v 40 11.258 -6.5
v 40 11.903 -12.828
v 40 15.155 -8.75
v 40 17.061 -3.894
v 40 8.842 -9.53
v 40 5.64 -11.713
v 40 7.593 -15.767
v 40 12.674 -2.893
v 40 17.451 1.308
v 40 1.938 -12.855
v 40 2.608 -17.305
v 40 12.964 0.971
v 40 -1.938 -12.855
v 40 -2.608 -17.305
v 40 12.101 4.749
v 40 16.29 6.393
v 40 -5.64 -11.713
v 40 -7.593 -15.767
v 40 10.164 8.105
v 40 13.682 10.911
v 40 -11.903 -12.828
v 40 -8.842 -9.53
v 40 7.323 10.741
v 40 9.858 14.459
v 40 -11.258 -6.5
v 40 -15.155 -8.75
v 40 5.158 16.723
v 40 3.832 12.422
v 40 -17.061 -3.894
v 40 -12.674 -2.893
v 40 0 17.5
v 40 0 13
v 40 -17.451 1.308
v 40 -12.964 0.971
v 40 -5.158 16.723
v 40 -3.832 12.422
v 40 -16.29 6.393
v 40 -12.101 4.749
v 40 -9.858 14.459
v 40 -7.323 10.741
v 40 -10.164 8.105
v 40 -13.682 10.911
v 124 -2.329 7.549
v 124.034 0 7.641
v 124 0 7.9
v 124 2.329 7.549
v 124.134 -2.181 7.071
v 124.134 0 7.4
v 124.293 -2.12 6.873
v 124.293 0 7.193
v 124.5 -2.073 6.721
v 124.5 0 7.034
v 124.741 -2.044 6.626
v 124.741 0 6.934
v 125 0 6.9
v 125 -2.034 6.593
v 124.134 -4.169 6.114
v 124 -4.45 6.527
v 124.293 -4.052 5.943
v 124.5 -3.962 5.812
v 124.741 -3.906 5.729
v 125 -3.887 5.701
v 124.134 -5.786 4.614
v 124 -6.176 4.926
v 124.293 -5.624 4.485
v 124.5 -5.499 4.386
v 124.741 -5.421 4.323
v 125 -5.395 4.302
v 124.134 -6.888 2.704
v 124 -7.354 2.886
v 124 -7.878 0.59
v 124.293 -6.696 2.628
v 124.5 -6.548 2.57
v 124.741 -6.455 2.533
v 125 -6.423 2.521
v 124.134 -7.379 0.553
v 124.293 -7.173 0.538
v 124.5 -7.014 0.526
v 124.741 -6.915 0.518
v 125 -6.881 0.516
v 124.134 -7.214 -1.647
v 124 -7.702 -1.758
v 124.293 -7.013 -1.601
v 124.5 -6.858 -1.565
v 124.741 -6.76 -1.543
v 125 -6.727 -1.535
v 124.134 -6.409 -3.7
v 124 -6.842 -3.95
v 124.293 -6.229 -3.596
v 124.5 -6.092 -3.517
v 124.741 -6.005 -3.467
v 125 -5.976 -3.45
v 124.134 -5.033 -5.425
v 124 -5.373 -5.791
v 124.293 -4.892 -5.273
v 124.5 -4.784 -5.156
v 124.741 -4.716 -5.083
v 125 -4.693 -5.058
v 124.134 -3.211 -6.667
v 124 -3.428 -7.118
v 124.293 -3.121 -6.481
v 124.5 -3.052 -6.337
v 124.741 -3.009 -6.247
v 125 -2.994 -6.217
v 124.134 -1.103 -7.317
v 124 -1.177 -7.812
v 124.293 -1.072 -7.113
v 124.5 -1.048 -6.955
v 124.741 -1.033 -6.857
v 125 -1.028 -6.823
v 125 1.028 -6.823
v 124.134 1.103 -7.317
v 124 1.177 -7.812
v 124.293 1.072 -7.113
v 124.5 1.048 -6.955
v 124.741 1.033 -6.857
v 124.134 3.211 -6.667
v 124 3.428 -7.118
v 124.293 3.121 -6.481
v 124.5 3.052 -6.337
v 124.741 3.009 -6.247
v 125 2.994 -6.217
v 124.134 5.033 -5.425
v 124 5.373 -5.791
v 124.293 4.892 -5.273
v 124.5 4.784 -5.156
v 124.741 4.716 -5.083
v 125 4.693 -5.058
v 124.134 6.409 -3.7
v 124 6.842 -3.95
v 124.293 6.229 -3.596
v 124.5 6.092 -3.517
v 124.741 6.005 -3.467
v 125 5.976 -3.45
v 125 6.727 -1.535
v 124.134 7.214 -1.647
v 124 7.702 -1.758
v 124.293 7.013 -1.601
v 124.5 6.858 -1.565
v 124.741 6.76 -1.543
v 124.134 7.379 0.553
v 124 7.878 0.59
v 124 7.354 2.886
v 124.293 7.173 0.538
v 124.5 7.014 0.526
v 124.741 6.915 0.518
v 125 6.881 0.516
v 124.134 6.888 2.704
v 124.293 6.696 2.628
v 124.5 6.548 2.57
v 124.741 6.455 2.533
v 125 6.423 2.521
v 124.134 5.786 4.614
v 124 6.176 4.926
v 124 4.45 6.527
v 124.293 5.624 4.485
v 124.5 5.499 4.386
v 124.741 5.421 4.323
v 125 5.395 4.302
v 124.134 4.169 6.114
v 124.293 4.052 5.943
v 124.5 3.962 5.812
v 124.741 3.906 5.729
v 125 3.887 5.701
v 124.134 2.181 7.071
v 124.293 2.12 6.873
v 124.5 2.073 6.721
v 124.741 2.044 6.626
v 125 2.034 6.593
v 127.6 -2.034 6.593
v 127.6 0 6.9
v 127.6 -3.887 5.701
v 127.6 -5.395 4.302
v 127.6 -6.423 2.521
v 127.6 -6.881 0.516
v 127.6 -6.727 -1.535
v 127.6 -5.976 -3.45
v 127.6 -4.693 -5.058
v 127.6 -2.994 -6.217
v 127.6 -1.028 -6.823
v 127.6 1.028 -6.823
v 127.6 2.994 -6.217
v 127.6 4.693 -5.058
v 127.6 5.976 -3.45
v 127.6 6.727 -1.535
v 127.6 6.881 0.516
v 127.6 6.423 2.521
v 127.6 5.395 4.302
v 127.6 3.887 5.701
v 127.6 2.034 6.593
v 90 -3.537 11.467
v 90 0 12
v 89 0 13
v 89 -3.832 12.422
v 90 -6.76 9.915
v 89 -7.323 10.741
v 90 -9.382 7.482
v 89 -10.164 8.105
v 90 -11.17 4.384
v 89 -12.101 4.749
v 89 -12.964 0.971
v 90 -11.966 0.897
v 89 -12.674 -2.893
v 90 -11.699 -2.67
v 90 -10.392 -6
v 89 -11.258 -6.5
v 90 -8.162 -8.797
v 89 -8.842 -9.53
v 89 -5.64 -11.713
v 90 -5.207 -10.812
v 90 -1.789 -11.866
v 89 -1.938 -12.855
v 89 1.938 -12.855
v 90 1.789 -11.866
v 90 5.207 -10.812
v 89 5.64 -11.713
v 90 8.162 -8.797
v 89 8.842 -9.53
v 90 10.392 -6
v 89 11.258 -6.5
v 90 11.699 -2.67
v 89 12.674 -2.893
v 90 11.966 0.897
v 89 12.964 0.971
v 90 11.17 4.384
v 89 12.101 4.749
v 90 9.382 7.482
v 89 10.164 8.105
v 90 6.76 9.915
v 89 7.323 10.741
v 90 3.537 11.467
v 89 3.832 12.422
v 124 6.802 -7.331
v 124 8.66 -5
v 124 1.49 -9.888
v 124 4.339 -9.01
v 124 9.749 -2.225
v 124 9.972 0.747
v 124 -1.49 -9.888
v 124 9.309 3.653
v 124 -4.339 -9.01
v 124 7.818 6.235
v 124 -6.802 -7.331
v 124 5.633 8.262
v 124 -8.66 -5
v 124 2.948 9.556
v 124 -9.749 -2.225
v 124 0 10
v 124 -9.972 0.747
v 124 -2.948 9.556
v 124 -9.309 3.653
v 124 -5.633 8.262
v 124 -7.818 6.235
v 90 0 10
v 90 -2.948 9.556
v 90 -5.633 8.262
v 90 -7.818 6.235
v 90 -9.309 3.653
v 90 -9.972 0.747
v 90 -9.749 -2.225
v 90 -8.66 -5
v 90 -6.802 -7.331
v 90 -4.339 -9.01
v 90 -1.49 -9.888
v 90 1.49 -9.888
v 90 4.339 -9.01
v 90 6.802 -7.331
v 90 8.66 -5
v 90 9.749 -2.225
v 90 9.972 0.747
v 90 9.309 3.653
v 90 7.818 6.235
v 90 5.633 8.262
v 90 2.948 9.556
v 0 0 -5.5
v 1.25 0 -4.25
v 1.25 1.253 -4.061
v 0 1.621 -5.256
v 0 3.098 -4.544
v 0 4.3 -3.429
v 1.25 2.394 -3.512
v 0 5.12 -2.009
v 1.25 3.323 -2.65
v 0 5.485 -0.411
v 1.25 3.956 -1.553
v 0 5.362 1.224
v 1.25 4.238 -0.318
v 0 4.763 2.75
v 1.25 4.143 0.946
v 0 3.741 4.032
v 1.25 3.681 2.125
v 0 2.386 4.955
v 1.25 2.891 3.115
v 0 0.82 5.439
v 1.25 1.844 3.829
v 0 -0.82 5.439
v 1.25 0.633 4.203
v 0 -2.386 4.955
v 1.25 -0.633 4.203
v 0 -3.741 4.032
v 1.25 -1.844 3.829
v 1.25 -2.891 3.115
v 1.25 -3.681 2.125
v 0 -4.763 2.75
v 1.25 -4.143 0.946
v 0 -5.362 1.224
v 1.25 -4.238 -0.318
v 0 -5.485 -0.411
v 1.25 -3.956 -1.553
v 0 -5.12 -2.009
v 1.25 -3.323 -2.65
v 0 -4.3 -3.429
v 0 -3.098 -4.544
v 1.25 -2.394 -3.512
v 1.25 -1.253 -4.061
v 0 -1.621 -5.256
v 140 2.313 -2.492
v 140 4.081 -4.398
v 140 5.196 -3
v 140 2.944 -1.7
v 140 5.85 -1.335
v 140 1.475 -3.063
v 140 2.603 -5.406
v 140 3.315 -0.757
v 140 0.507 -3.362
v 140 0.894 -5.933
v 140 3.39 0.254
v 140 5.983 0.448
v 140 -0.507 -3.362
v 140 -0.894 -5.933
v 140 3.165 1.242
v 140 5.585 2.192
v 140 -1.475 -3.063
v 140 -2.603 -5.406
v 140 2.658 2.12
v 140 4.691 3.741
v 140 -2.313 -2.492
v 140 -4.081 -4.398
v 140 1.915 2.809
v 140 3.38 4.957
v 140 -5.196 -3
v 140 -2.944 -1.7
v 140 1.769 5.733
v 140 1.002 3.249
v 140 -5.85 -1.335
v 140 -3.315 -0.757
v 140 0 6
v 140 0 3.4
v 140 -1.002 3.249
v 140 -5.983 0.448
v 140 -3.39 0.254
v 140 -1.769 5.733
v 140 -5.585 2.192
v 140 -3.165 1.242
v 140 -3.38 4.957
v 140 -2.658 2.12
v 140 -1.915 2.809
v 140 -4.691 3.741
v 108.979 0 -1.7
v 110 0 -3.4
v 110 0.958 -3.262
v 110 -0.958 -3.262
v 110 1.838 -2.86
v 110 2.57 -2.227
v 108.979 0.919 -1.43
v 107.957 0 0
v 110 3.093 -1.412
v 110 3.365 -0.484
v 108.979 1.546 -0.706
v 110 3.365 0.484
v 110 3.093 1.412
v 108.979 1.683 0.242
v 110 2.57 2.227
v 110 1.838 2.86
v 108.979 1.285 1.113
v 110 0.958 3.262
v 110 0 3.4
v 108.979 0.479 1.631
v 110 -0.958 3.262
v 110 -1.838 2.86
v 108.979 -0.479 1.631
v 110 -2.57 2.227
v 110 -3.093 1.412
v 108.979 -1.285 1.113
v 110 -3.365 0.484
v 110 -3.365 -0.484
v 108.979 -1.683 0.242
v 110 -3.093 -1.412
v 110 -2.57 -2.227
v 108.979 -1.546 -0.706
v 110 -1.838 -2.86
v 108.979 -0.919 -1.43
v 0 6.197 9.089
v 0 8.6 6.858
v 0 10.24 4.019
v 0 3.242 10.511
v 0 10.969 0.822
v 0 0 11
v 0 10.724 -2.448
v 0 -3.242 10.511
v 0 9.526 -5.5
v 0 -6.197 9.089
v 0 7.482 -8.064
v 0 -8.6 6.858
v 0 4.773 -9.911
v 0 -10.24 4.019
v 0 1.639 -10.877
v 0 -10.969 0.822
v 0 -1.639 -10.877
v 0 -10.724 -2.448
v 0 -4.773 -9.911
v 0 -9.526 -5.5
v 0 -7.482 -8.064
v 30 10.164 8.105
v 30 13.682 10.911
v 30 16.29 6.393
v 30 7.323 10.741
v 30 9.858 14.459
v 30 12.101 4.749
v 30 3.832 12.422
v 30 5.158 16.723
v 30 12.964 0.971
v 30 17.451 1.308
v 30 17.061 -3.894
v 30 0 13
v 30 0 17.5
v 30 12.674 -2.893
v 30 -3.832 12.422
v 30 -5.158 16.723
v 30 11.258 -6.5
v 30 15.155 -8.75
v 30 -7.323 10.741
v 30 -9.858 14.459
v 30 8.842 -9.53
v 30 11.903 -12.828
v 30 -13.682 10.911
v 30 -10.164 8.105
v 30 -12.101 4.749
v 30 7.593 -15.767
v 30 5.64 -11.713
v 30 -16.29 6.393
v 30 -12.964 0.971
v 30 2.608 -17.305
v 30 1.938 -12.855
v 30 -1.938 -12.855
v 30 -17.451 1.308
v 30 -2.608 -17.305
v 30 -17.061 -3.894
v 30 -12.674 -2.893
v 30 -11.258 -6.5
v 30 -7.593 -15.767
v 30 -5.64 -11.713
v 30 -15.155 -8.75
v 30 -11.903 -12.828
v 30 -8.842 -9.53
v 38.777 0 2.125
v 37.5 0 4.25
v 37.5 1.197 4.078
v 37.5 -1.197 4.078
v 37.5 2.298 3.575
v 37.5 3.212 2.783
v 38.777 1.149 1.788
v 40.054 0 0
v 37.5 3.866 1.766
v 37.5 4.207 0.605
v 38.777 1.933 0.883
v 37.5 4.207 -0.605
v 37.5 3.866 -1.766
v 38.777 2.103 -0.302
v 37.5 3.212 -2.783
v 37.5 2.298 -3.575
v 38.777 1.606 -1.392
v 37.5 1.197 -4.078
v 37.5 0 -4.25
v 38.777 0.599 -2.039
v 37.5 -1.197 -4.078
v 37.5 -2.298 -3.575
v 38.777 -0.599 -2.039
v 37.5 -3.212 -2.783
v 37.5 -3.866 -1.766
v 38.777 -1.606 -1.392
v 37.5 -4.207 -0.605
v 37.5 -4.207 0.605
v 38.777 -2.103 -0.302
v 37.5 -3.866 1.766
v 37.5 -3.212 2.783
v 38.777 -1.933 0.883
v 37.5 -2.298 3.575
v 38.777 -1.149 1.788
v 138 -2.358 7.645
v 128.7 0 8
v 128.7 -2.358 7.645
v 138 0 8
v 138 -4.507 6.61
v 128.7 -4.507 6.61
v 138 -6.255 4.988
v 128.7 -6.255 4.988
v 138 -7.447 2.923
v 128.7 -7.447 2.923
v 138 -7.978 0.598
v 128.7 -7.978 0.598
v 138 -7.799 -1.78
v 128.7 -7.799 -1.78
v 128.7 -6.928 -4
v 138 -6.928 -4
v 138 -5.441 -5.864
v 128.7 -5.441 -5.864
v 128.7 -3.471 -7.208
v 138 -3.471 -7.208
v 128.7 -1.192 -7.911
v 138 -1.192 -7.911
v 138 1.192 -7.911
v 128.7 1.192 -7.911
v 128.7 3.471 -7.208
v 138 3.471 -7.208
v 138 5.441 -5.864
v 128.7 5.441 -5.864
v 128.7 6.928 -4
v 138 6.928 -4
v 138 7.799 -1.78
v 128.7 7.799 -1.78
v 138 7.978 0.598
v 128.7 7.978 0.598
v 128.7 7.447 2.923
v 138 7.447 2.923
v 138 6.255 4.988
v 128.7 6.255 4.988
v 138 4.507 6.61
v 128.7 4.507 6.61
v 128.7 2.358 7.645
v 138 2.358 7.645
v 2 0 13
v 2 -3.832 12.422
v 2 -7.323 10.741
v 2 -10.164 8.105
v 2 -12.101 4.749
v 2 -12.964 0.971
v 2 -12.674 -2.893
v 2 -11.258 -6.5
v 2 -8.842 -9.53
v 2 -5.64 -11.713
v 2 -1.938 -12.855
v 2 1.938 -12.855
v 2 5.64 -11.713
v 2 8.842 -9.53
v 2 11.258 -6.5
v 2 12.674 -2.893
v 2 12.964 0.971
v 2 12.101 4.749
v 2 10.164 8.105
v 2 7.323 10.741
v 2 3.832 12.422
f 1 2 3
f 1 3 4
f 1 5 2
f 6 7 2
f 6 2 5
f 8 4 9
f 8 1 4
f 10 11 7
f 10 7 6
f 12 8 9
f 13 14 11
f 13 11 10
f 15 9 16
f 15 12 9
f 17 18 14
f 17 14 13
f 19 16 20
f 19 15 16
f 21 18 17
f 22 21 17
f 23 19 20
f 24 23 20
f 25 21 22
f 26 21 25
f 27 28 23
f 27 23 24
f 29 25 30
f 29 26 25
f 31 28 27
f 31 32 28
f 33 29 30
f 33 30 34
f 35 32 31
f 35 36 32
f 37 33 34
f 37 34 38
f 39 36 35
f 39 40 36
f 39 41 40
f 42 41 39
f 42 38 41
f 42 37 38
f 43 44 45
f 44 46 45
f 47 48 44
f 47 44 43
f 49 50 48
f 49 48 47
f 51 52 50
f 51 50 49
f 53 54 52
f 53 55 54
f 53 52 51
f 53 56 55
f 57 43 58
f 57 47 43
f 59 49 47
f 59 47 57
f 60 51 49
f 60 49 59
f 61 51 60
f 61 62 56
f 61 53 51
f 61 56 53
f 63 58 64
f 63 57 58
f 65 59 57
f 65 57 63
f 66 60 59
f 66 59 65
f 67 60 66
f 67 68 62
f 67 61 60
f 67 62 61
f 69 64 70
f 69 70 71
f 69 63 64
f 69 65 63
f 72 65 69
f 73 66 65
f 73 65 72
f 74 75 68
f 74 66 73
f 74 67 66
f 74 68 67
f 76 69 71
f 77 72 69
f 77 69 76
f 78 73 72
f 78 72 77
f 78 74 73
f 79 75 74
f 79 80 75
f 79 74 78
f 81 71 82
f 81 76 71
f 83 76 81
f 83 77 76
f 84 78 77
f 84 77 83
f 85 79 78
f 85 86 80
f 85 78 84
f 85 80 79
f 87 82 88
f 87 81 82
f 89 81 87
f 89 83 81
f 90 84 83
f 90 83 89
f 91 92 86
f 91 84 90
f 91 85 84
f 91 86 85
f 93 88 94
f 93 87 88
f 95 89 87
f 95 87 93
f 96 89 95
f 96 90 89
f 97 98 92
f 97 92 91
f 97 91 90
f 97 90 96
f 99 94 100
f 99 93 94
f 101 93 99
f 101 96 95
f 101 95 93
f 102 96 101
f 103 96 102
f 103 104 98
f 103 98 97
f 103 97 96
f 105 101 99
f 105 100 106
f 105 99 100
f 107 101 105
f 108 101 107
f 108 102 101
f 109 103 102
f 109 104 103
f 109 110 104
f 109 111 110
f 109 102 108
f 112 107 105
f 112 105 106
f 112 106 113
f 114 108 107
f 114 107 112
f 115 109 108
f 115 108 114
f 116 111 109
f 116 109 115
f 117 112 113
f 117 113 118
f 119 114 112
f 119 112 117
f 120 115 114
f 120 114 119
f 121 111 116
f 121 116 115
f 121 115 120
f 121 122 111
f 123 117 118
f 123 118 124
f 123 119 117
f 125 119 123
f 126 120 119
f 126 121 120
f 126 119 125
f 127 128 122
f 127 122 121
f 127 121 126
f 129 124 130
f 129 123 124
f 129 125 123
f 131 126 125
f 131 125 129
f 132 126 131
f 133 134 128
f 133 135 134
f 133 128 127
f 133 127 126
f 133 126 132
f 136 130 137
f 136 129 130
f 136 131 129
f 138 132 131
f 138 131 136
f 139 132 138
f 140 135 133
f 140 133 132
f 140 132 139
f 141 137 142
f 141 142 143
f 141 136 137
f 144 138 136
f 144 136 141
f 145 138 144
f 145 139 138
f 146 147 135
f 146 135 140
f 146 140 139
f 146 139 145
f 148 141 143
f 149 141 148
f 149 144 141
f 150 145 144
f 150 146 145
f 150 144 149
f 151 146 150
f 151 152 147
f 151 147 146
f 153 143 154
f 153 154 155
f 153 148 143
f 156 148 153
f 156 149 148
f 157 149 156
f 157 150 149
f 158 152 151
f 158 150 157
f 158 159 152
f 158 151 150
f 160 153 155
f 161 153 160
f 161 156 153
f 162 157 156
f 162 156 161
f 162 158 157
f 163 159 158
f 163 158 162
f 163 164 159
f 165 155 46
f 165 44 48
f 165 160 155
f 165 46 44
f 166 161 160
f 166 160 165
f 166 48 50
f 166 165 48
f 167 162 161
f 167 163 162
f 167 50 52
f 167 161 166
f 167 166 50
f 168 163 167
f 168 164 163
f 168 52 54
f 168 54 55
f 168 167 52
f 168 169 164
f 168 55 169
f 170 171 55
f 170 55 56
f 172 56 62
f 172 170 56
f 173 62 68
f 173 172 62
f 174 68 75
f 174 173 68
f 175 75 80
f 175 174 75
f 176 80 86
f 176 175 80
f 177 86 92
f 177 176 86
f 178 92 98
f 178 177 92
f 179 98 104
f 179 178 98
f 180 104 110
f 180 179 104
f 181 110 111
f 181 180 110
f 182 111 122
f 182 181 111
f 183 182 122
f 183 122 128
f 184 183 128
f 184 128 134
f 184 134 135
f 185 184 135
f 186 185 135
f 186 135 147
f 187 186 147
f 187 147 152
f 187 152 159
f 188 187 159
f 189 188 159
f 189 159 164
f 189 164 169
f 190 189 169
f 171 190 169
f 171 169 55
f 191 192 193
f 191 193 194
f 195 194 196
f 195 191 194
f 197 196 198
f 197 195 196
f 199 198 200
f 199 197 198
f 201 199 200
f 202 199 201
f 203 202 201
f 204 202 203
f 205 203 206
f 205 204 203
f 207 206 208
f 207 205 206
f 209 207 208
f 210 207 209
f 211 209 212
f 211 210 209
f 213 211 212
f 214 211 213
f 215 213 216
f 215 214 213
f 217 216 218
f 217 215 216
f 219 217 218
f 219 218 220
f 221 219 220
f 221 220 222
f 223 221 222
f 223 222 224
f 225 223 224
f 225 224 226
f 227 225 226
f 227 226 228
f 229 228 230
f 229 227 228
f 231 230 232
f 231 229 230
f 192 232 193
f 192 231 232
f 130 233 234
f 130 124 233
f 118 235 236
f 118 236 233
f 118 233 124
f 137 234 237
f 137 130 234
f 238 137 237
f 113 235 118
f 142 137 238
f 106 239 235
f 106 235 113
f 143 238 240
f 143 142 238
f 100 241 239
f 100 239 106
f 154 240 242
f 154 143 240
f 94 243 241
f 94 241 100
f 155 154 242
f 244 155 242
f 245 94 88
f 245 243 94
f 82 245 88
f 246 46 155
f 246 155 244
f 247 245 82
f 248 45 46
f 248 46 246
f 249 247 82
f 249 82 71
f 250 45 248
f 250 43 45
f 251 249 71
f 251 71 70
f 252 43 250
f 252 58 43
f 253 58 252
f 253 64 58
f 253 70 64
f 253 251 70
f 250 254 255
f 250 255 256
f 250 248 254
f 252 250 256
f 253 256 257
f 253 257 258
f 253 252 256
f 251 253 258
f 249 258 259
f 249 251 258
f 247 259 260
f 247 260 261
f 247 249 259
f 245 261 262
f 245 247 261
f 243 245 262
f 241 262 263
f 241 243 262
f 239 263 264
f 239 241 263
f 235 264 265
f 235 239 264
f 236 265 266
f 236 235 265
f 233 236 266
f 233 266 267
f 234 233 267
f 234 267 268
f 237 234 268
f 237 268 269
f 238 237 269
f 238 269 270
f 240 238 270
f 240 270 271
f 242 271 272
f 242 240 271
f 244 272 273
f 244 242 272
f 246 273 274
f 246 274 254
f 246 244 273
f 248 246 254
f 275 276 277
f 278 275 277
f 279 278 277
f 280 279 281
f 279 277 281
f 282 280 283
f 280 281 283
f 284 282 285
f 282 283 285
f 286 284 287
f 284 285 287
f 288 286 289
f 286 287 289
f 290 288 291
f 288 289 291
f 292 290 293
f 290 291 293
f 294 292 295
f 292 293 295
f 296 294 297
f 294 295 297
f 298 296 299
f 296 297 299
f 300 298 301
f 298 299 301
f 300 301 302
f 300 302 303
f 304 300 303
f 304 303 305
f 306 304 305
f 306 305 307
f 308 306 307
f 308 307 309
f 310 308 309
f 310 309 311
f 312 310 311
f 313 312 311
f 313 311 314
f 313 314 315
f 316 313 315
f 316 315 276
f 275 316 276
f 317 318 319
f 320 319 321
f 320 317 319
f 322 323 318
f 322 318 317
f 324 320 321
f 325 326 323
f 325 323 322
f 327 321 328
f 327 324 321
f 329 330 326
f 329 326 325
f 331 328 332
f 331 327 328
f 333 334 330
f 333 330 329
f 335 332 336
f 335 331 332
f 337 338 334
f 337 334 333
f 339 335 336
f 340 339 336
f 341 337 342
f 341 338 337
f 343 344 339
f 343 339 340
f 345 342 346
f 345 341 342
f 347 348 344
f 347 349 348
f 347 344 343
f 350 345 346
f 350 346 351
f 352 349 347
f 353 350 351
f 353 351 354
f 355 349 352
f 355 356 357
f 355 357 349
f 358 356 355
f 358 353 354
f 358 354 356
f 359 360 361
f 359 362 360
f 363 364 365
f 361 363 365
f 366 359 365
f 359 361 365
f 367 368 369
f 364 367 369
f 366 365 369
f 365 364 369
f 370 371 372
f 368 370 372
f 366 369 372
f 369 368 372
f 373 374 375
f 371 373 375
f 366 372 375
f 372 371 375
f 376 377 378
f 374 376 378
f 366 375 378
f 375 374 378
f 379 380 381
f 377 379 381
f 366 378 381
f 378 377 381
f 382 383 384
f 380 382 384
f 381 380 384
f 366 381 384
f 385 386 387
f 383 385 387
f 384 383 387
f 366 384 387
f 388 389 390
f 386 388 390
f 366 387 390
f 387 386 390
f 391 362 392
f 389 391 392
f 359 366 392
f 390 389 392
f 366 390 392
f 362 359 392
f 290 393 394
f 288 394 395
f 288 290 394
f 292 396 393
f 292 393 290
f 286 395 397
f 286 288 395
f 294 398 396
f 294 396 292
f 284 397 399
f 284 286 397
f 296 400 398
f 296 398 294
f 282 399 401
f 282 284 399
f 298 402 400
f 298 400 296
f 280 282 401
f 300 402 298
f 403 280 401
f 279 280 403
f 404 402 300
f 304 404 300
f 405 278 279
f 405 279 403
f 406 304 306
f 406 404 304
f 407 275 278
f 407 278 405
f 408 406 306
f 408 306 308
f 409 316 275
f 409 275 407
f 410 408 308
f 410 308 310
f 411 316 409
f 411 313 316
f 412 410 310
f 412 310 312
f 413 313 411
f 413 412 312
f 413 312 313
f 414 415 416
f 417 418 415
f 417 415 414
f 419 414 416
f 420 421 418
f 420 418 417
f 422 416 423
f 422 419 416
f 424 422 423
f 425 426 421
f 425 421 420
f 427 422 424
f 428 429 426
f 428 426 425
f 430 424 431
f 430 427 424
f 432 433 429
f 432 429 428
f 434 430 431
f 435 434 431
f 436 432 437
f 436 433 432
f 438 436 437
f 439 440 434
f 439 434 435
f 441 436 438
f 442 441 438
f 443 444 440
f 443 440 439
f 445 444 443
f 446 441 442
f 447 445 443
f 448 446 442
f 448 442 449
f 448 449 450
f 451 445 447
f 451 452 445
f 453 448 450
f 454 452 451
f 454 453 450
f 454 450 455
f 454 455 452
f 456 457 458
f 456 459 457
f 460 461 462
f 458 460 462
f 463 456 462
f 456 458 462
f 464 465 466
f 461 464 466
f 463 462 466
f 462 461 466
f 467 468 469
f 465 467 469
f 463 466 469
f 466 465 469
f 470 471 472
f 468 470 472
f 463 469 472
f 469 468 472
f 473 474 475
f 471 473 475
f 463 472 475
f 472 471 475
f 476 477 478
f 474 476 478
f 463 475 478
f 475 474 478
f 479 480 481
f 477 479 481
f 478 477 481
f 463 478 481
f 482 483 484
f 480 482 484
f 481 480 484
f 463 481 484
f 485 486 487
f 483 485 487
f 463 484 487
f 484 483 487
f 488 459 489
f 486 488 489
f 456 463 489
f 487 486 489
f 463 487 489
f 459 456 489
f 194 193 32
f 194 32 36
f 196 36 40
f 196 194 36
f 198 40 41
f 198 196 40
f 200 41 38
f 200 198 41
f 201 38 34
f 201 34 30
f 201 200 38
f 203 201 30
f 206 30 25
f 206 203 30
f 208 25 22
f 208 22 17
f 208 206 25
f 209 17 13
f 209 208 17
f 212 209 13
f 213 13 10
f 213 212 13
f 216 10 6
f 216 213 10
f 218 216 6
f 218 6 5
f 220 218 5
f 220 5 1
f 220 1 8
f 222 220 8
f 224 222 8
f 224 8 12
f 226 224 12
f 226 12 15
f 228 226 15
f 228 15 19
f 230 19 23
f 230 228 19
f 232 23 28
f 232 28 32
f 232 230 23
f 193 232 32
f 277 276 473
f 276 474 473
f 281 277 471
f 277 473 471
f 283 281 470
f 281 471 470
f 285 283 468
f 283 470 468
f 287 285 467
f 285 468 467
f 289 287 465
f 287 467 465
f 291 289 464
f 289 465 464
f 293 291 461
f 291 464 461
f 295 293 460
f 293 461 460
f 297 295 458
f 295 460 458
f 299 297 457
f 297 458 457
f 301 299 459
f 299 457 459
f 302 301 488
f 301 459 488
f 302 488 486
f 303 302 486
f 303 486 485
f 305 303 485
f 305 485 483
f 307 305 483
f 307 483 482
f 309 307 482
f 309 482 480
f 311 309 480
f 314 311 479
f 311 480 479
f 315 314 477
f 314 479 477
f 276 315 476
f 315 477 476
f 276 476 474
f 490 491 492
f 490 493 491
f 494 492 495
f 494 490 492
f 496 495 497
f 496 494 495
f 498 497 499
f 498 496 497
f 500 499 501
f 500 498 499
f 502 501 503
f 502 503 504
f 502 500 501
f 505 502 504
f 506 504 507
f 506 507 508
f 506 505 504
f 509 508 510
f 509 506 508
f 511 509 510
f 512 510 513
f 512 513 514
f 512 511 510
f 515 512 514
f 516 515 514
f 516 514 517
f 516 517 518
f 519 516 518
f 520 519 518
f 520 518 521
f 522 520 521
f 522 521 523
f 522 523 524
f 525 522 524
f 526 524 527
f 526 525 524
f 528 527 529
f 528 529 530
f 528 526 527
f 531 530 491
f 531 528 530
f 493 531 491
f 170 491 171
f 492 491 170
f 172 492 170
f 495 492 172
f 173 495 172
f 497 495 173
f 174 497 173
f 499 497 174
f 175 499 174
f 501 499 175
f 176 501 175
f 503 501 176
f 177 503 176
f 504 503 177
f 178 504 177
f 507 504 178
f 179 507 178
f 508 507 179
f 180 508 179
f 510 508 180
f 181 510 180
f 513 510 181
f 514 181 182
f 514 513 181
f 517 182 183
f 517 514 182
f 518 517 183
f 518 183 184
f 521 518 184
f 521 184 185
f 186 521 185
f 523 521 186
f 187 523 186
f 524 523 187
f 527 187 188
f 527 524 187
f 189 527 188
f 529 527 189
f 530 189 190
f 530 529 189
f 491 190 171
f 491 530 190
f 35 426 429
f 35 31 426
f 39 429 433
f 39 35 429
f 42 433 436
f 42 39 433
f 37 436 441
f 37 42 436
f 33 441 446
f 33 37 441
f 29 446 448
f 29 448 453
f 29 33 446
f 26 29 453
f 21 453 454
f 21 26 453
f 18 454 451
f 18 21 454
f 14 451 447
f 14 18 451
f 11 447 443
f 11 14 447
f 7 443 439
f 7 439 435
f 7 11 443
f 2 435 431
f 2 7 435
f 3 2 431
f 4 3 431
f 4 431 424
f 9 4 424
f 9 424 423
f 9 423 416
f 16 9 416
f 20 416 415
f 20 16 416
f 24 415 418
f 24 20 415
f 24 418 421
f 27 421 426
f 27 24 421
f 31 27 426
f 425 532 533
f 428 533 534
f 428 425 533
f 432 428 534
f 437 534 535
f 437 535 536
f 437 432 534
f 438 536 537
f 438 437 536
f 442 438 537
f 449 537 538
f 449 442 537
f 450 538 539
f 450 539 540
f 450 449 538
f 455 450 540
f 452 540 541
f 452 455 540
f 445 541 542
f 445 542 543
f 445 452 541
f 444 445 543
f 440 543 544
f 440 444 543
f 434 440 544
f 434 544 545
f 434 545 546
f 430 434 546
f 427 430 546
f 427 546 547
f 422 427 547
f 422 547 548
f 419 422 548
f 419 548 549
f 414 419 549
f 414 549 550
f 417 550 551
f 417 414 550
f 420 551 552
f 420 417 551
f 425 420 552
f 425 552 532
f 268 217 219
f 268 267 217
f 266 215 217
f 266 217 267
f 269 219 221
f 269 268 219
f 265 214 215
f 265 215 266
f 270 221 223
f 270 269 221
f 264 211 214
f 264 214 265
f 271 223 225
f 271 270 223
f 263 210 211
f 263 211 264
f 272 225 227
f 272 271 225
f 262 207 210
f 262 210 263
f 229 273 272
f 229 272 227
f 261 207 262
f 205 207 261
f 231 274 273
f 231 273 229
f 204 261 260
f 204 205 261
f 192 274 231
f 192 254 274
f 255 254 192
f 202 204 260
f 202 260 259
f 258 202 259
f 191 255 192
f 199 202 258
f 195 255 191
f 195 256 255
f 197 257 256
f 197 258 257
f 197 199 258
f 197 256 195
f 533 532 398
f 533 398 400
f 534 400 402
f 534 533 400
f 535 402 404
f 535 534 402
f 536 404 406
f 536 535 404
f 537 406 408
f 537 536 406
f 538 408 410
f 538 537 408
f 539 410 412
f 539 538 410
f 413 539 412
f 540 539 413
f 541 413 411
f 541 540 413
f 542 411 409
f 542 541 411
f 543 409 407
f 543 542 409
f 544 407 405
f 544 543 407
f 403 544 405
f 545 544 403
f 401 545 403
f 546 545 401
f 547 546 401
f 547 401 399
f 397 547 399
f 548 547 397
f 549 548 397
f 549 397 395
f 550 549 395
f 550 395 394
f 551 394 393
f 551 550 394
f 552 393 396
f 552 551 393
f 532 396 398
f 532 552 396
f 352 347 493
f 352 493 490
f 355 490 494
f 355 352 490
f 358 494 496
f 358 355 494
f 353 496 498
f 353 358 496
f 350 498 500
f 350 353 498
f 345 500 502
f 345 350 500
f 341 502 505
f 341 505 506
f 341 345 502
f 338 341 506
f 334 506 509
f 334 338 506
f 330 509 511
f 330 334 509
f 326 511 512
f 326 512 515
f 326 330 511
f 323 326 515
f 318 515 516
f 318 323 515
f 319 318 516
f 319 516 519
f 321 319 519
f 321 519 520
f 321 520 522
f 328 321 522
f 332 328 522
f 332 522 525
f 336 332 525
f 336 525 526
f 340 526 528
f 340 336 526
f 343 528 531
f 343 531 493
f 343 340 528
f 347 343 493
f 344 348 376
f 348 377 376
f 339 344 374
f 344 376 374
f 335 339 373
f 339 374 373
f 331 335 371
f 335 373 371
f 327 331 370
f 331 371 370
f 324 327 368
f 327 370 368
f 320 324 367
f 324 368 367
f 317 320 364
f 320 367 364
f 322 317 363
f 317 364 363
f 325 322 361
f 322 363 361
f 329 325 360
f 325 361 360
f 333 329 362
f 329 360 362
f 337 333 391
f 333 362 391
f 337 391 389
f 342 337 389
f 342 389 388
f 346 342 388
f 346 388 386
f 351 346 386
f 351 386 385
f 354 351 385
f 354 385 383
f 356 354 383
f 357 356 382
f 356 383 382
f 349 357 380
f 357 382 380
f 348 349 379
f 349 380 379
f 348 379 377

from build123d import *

# Parameters (mm, degrees)
M10X1_52_D            = 8.5
M10X1_52_DEPTH        = 37.5
M10X1_52_CSINK_D      = 11
M10X1_52_CSINK_ANGLE  = 90
M10X1_52_TIP          = 2.553657631
HOLE_WIZARD_M81_D     = 6.8
HOLE_WIZARD_M81_DEPTH = 30
HOLE_WIZARD_M81_TIP   = 2.042926105
SKETCH_6_W            = 2.5
SKETCH_6_H            = 1.1
CHAMFER_1_SIZE        = 2
CHAMFER_2_SIZE        = 1
CHAMFER_3_SIZE        = 2.2
FILLET_1_R            = 1


with BuildPart() as part:
    # Эскиз1 → Повернуть1 (revolve)
    with BuildSketch(Plane.XY, mode=Mode.PRIVATE) as revolve_1_sk:
        Polygon((0, 0), (0, 13), (30, 13), (30, 17.5), (40, 17.5), (40, 13), (90, 13), (90, 10), (124, 10), (124, 8), (140, 8), (140, 0), align=None)
    revolve(revolve_1_sk.sketch.rotate(Axis((-123.335902371, 0, 0), (1, 0, 0)), 90), axis=Axis((-123.335902371, 0, 0), (1, 0, 0)))

    # Отверстие обработанное метчиком M10x1.52
    with Locations(Plane.ZY):
        with Locations((0, 0)):
            CounterSinkHole(M10X1_52_D / 2, M10X1_52_CSINK_D / 2, depth=M10X1_52_DEPTH, counter_sink_angle=M10X1_52_CSINK_ANGLE)
            with Locations((0, 0, -(M10X1_52_DEPTH + M10X1_52_TIP / 2))):  # 118° drill point
                Cone(0, M10X1_52_D / 2, M10X1_52_TIP, mode=Mode.SUBTRACT)

    # Отверстие обработанное метчиком M81
    with Locations(Plane(origin=(140, 0, 0), x_dir=(0, 0, -1), z_dir=(1, 0, 0))):
        with Locations((0, 0)):
            Hole(HOLE_WIZARD_M81_D / 2, depth=HOLE_WIZARD_M81_DEPTH)
            with Locations((0, 0, -(HOLE_WIZARD_M81_DEPTH + HOLE_WIZARD_M81_TIP / 2))):  # 118° drill point
                Cone(0, HOLE_WIZARD_M81_D / 2, HOLE_WIZARD_M81_TIP, mode=Mode.SUBTRACT)

    # Эскиз6 → Вырез-Повернуть1 (revolve, cut)
    with BuildSketch(Plane.XY, mode=Mode.PRIVATE) as cut_revolve_1_sk:
        with Locations((125.25, 7.45)):
            Rectangle(SKETCH_6_W, SKETCH_6_H)
    revolve(cut_revolve_1_sk.sketch.rotate(Axis((0, 0, 0), (1, 0, 0)), 90), axis=Axis((0, 0, 0), (1, 0, 0)), mode=Mode.SUBTRACT)

    # Фаска1
    chamfer_1_edges = [part.edges().sort_by_distance(p)[0] for p in [
        (0, 0, -13),
        (140, 0, -8),
    ]]
    chamfer(chamfer_1_edges, length=CHAMFER_1_SIZE)

    # Фаска2
    chamfer_2_edges = [part.edges().sort_by_distance(p)[0] for p in [
        (90, 0, -13),
    ]]
    chamfer(chamfer_2_edges, length=CHAMFER_2_SIZE)

    # Фаска3
    # the kernel refuses this chamfer: 2.2 mm, written as the material it takes off along each edge
    with BuildSketch(Plane(origin=(126.5, 0, 0), x_dir=(0, 0, 1), z_dir=(0, 1, 0))) as chamfer_3_piece_1_section:
        Polygon((8 - CHAMFER_3_SIZE, 0), (8, CHAMFER_3_SIZE), (8, 0), align=None)
    chamfer_3_piece_1 = revolve(axis=Axis((126.5, 0, 0), (1, 0, 0)), mode=Mode.PRIVATE)
    chamfer_3_piece_1 = chamfer_3_piece_1 - Plane(origin=(128.148983784, 0, 0), x_dir=(0, 0, 1), z_dir=(-1, 0, 0)) * Cylinder(6.9, 32, mode=Mode.PRIVATE)
    add(chamfer_3_piece_1, mode=Mode.SUBTRACT)

    # Скругление1
    fillet_1_edges = [part.edges().sort_by_distance(p)[0] for p in [
        (124, 0, -6.9),
    ]]
    fillet(fillet_1_edges, radius=FILLET_1_R)


solid = part.part
